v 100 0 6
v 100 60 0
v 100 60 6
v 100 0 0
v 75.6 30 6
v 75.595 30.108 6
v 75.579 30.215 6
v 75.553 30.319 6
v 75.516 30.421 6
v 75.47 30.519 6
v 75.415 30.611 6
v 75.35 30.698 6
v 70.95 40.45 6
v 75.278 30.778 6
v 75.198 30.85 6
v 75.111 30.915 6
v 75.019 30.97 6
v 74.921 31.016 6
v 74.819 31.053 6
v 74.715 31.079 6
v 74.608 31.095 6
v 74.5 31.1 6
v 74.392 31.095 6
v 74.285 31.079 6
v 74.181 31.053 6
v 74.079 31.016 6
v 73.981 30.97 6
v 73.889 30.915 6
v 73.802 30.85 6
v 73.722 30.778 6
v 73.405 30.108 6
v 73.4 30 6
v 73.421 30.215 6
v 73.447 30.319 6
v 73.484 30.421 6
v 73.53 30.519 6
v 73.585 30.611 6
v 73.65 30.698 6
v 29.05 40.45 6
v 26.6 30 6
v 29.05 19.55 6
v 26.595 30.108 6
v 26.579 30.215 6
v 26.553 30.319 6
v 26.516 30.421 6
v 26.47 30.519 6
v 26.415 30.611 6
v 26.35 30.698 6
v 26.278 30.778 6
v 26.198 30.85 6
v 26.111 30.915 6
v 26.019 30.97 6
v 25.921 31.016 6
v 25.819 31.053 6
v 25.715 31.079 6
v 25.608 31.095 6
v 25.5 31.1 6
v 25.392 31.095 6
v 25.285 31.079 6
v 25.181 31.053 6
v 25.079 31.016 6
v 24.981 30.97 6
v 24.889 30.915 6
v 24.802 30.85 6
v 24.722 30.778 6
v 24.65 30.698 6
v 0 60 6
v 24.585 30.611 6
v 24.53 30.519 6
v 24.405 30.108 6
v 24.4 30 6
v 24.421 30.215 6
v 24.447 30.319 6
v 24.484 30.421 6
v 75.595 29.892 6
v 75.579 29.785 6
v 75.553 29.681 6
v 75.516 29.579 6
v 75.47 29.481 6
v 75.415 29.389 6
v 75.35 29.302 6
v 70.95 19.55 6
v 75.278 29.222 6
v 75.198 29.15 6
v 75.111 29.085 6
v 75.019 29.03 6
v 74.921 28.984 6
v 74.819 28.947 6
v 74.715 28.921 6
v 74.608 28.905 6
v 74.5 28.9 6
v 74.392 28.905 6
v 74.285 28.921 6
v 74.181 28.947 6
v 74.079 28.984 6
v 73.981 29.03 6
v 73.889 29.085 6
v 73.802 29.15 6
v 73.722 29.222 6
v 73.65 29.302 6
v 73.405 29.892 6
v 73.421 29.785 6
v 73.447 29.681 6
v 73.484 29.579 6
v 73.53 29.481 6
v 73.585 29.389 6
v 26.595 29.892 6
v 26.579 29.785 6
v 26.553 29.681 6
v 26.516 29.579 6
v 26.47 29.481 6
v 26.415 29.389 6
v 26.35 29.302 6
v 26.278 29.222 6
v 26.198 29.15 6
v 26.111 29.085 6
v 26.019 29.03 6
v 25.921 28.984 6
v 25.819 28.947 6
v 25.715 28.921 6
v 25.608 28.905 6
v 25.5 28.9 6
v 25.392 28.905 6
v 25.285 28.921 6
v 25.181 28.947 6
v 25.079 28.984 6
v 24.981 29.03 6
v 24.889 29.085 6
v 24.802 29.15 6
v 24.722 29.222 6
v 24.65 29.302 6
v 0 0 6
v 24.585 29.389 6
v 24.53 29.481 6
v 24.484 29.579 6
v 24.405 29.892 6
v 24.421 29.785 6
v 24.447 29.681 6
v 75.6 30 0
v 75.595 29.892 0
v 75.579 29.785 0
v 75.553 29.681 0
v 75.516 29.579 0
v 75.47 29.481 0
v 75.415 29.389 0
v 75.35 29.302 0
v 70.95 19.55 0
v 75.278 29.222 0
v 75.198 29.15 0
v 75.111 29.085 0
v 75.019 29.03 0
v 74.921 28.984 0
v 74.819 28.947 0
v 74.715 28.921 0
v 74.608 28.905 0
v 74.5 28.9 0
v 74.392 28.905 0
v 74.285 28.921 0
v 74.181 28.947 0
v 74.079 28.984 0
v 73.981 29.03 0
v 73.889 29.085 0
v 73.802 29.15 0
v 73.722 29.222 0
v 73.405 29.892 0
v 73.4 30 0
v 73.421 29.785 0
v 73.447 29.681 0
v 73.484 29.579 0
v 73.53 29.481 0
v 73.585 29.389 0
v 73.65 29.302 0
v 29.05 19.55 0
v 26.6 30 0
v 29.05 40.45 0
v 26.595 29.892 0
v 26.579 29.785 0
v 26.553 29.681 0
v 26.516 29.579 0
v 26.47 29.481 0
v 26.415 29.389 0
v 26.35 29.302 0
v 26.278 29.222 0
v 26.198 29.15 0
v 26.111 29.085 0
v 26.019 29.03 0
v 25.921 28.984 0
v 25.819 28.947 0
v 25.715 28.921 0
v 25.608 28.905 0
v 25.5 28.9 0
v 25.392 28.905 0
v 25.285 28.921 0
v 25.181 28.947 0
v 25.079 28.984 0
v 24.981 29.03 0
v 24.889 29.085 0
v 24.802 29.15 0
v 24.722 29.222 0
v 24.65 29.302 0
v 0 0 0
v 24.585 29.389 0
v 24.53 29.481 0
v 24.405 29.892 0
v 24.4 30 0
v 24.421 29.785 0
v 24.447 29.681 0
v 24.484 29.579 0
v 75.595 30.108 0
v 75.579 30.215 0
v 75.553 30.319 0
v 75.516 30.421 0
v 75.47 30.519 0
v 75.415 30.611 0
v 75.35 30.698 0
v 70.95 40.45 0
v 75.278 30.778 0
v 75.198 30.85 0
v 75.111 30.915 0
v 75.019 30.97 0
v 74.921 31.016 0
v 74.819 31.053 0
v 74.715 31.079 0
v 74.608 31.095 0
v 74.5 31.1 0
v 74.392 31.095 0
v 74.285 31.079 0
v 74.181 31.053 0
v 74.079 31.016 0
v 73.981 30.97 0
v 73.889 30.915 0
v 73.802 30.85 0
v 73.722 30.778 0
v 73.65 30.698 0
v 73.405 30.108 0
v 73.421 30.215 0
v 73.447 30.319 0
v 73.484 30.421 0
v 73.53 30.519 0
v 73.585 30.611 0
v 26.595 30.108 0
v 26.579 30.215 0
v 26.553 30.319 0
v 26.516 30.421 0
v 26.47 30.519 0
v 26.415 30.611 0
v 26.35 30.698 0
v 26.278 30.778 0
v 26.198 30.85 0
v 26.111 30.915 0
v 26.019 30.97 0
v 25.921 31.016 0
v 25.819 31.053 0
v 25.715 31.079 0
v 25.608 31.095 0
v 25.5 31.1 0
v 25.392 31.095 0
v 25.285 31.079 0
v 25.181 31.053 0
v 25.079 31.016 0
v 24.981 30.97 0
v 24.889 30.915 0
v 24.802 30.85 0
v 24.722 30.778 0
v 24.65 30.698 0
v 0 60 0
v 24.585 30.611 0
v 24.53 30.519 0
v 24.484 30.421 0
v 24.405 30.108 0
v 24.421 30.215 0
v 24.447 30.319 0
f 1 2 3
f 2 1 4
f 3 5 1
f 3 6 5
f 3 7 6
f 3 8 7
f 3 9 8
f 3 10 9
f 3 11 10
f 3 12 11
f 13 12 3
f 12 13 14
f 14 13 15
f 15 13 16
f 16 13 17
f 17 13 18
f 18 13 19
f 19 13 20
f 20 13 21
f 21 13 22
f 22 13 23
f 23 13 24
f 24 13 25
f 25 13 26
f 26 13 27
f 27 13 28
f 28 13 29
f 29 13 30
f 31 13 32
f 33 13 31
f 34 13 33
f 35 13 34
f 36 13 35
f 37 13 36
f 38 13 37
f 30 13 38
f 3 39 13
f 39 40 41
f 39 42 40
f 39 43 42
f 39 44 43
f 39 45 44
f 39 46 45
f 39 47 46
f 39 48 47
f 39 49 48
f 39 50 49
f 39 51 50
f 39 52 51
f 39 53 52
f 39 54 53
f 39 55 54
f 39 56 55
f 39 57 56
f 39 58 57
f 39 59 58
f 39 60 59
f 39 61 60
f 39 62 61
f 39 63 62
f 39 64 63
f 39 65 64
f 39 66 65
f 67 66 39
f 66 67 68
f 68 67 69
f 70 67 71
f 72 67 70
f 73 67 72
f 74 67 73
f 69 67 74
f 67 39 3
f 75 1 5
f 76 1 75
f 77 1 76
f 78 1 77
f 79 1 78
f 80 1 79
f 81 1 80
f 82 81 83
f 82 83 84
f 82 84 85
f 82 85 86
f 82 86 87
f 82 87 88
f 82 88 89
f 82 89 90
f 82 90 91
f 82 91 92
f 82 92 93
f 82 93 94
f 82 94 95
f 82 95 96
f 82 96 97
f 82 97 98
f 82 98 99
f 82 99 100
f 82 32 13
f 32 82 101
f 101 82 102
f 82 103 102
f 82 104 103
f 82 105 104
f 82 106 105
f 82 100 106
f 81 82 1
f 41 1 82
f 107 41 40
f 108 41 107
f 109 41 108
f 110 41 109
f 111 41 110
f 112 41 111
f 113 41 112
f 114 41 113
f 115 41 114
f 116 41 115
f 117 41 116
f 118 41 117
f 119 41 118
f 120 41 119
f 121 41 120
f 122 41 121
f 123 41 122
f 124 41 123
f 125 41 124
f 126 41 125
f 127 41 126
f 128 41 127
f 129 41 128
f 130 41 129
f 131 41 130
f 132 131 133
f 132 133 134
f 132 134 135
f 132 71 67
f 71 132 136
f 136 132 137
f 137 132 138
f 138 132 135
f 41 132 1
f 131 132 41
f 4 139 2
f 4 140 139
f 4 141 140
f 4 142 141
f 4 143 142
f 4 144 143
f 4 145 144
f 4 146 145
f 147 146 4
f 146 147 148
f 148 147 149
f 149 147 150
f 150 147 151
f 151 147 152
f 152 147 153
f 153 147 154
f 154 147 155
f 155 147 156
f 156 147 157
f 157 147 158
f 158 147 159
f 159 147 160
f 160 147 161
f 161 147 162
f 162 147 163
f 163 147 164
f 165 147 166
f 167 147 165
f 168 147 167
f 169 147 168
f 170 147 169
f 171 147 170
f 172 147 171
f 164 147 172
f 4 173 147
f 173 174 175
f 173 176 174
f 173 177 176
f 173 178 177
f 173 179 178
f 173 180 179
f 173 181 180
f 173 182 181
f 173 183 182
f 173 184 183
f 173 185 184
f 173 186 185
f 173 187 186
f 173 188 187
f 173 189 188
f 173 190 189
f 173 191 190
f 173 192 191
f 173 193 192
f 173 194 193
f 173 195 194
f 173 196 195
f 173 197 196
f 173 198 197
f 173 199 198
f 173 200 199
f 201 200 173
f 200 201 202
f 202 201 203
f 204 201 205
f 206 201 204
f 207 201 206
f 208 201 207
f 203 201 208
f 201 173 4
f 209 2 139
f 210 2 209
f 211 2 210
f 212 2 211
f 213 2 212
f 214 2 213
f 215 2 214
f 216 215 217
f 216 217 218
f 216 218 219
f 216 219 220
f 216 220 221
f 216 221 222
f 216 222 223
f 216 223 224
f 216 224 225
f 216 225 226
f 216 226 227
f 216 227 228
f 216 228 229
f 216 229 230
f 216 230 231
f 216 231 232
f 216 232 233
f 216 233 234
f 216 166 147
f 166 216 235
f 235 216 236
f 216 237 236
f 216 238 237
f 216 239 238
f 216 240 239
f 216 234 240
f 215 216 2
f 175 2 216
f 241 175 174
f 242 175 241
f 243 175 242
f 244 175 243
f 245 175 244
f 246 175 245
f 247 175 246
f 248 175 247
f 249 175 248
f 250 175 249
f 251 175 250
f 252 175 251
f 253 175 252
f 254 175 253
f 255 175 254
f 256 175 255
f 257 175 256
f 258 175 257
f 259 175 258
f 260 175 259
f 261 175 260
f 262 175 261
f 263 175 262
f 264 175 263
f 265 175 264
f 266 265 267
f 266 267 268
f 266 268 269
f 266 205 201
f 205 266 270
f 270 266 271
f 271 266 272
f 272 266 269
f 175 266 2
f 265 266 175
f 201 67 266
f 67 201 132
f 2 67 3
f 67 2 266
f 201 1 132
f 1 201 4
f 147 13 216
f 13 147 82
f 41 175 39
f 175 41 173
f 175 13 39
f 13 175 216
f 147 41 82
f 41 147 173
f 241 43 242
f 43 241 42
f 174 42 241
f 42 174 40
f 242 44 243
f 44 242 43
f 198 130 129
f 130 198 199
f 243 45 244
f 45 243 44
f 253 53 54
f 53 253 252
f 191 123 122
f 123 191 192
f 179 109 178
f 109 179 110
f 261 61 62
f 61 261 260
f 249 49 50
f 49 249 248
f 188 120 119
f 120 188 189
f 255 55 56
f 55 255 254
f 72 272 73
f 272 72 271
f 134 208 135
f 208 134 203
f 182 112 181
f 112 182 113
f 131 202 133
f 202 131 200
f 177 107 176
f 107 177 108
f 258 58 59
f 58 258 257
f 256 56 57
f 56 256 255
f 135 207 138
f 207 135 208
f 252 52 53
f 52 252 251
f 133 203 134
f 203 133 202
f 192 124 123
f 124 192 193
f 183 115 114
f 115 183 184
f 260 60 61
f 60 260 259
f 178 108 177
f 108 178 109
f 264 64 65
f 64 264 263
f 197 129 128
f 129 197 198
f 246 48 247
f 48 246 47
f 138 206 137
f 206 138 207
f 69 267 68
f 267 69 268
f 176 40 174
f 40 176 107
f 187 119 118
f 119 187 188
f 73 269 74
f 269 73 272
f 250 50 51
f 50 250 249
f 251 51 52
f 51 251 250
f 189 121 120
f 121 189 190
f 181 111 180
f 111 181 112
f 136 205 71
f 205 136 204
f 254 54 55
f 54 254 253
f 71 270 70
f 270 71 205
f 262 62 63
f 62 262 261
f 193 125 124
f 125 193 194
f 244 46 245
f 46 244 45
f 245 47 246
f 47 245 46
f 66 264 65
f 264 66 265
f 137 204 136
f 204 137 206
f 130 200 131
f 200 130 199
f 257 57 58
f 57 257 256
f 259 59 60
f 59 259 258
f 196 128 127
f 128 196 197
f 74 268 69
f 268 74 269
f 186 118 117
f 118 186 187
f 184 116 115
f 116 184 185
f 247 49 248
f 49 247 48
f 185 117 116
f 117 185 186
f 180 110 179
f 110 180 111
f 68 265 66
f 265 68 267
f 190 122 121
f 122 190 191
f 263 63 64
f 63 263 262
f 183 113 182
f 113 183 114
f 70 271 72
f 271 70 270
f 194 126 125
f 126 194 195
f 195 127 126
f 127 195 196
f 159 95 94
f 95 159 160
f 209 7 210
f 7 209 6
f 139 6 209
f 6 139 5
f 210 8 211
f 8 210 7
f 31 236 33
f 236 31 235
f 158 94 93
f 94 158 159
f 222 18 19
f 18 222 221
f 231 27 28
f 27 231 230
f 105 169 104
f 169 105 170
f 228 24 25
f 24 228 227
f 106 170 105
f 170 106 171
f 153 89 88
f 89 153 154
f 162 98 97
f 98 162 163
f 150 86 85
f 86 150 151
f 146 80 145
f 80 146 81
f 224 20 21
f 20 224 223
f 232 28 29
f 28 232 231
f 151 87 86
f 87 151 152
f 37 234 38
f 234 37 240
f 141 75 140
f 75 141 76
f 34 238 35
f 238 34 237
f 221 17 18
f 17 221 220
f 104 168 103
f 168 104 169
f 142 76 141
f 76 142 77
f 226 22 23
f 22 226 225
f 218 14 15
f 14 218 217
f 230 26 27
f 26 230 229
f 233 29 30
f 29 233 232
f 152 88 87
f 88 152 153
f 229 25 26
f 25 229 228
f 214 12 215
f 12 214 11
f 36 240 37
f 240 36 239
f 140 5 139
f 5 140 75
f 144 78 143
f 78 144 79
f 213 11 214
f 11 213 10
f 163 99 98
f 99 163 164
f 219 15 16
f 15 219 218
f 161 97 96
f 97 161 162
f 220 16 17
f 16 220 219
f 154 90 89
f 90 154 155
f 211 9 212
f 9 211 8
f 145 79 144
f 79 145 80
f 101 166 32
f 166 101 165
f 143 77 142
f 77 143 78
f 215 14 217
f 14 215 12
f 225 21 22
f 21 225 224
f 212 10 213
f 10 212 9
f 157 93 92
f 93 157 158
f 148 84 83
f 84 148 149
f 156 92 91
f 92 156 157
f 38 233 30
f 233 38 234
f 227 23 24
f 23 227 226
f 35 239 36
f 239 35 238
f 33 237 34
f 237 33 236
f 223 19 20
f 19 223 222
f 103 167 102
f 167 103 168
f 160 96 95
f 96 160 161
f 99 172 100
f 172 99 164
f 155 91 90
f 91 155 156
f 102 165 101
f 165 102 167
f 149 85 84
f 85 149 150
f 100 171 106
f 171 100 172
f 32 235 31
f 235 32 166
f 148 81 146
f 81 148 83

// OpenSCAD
// Auto-generated by Mecha-Splicer
// servo_mount=bench_mix_4_hip_mount servo=mg996r

$fn = 64;

module servo_mount() {
  plate_w = 100.0; plate_h = 60.0; plate_t = 6.0;
  clearance = 0.6; hole_d = 2.2;
  body_w = 40.7; body_h = 19.7; flange_w = 54.0; flange_h = 19.7;
  hole_spacing_x = 49.0;
  difference() {
    cube([plate_w, plate_h, plate_t], center=false);
    translate([(plate_w-body_w-clearance*2)/2, (plate_h-body_h-clearance*2)/2, -1])
      cube([body_w+clearance*2, body_h+clearance*2, plate_t+2], center=false);
    translate([plate_w/2 - hole_spacing_x/2, plate_h/2, -1]) cylinder(h=plate_t+2, d=hole_d, center=false);
    translate([plate_w/2 + hole_spacing_x/2, plate_h/2, -1]) cylinder(h=plate_t+2, d=hole_d, center=false);
  }
}
servo_mount();
